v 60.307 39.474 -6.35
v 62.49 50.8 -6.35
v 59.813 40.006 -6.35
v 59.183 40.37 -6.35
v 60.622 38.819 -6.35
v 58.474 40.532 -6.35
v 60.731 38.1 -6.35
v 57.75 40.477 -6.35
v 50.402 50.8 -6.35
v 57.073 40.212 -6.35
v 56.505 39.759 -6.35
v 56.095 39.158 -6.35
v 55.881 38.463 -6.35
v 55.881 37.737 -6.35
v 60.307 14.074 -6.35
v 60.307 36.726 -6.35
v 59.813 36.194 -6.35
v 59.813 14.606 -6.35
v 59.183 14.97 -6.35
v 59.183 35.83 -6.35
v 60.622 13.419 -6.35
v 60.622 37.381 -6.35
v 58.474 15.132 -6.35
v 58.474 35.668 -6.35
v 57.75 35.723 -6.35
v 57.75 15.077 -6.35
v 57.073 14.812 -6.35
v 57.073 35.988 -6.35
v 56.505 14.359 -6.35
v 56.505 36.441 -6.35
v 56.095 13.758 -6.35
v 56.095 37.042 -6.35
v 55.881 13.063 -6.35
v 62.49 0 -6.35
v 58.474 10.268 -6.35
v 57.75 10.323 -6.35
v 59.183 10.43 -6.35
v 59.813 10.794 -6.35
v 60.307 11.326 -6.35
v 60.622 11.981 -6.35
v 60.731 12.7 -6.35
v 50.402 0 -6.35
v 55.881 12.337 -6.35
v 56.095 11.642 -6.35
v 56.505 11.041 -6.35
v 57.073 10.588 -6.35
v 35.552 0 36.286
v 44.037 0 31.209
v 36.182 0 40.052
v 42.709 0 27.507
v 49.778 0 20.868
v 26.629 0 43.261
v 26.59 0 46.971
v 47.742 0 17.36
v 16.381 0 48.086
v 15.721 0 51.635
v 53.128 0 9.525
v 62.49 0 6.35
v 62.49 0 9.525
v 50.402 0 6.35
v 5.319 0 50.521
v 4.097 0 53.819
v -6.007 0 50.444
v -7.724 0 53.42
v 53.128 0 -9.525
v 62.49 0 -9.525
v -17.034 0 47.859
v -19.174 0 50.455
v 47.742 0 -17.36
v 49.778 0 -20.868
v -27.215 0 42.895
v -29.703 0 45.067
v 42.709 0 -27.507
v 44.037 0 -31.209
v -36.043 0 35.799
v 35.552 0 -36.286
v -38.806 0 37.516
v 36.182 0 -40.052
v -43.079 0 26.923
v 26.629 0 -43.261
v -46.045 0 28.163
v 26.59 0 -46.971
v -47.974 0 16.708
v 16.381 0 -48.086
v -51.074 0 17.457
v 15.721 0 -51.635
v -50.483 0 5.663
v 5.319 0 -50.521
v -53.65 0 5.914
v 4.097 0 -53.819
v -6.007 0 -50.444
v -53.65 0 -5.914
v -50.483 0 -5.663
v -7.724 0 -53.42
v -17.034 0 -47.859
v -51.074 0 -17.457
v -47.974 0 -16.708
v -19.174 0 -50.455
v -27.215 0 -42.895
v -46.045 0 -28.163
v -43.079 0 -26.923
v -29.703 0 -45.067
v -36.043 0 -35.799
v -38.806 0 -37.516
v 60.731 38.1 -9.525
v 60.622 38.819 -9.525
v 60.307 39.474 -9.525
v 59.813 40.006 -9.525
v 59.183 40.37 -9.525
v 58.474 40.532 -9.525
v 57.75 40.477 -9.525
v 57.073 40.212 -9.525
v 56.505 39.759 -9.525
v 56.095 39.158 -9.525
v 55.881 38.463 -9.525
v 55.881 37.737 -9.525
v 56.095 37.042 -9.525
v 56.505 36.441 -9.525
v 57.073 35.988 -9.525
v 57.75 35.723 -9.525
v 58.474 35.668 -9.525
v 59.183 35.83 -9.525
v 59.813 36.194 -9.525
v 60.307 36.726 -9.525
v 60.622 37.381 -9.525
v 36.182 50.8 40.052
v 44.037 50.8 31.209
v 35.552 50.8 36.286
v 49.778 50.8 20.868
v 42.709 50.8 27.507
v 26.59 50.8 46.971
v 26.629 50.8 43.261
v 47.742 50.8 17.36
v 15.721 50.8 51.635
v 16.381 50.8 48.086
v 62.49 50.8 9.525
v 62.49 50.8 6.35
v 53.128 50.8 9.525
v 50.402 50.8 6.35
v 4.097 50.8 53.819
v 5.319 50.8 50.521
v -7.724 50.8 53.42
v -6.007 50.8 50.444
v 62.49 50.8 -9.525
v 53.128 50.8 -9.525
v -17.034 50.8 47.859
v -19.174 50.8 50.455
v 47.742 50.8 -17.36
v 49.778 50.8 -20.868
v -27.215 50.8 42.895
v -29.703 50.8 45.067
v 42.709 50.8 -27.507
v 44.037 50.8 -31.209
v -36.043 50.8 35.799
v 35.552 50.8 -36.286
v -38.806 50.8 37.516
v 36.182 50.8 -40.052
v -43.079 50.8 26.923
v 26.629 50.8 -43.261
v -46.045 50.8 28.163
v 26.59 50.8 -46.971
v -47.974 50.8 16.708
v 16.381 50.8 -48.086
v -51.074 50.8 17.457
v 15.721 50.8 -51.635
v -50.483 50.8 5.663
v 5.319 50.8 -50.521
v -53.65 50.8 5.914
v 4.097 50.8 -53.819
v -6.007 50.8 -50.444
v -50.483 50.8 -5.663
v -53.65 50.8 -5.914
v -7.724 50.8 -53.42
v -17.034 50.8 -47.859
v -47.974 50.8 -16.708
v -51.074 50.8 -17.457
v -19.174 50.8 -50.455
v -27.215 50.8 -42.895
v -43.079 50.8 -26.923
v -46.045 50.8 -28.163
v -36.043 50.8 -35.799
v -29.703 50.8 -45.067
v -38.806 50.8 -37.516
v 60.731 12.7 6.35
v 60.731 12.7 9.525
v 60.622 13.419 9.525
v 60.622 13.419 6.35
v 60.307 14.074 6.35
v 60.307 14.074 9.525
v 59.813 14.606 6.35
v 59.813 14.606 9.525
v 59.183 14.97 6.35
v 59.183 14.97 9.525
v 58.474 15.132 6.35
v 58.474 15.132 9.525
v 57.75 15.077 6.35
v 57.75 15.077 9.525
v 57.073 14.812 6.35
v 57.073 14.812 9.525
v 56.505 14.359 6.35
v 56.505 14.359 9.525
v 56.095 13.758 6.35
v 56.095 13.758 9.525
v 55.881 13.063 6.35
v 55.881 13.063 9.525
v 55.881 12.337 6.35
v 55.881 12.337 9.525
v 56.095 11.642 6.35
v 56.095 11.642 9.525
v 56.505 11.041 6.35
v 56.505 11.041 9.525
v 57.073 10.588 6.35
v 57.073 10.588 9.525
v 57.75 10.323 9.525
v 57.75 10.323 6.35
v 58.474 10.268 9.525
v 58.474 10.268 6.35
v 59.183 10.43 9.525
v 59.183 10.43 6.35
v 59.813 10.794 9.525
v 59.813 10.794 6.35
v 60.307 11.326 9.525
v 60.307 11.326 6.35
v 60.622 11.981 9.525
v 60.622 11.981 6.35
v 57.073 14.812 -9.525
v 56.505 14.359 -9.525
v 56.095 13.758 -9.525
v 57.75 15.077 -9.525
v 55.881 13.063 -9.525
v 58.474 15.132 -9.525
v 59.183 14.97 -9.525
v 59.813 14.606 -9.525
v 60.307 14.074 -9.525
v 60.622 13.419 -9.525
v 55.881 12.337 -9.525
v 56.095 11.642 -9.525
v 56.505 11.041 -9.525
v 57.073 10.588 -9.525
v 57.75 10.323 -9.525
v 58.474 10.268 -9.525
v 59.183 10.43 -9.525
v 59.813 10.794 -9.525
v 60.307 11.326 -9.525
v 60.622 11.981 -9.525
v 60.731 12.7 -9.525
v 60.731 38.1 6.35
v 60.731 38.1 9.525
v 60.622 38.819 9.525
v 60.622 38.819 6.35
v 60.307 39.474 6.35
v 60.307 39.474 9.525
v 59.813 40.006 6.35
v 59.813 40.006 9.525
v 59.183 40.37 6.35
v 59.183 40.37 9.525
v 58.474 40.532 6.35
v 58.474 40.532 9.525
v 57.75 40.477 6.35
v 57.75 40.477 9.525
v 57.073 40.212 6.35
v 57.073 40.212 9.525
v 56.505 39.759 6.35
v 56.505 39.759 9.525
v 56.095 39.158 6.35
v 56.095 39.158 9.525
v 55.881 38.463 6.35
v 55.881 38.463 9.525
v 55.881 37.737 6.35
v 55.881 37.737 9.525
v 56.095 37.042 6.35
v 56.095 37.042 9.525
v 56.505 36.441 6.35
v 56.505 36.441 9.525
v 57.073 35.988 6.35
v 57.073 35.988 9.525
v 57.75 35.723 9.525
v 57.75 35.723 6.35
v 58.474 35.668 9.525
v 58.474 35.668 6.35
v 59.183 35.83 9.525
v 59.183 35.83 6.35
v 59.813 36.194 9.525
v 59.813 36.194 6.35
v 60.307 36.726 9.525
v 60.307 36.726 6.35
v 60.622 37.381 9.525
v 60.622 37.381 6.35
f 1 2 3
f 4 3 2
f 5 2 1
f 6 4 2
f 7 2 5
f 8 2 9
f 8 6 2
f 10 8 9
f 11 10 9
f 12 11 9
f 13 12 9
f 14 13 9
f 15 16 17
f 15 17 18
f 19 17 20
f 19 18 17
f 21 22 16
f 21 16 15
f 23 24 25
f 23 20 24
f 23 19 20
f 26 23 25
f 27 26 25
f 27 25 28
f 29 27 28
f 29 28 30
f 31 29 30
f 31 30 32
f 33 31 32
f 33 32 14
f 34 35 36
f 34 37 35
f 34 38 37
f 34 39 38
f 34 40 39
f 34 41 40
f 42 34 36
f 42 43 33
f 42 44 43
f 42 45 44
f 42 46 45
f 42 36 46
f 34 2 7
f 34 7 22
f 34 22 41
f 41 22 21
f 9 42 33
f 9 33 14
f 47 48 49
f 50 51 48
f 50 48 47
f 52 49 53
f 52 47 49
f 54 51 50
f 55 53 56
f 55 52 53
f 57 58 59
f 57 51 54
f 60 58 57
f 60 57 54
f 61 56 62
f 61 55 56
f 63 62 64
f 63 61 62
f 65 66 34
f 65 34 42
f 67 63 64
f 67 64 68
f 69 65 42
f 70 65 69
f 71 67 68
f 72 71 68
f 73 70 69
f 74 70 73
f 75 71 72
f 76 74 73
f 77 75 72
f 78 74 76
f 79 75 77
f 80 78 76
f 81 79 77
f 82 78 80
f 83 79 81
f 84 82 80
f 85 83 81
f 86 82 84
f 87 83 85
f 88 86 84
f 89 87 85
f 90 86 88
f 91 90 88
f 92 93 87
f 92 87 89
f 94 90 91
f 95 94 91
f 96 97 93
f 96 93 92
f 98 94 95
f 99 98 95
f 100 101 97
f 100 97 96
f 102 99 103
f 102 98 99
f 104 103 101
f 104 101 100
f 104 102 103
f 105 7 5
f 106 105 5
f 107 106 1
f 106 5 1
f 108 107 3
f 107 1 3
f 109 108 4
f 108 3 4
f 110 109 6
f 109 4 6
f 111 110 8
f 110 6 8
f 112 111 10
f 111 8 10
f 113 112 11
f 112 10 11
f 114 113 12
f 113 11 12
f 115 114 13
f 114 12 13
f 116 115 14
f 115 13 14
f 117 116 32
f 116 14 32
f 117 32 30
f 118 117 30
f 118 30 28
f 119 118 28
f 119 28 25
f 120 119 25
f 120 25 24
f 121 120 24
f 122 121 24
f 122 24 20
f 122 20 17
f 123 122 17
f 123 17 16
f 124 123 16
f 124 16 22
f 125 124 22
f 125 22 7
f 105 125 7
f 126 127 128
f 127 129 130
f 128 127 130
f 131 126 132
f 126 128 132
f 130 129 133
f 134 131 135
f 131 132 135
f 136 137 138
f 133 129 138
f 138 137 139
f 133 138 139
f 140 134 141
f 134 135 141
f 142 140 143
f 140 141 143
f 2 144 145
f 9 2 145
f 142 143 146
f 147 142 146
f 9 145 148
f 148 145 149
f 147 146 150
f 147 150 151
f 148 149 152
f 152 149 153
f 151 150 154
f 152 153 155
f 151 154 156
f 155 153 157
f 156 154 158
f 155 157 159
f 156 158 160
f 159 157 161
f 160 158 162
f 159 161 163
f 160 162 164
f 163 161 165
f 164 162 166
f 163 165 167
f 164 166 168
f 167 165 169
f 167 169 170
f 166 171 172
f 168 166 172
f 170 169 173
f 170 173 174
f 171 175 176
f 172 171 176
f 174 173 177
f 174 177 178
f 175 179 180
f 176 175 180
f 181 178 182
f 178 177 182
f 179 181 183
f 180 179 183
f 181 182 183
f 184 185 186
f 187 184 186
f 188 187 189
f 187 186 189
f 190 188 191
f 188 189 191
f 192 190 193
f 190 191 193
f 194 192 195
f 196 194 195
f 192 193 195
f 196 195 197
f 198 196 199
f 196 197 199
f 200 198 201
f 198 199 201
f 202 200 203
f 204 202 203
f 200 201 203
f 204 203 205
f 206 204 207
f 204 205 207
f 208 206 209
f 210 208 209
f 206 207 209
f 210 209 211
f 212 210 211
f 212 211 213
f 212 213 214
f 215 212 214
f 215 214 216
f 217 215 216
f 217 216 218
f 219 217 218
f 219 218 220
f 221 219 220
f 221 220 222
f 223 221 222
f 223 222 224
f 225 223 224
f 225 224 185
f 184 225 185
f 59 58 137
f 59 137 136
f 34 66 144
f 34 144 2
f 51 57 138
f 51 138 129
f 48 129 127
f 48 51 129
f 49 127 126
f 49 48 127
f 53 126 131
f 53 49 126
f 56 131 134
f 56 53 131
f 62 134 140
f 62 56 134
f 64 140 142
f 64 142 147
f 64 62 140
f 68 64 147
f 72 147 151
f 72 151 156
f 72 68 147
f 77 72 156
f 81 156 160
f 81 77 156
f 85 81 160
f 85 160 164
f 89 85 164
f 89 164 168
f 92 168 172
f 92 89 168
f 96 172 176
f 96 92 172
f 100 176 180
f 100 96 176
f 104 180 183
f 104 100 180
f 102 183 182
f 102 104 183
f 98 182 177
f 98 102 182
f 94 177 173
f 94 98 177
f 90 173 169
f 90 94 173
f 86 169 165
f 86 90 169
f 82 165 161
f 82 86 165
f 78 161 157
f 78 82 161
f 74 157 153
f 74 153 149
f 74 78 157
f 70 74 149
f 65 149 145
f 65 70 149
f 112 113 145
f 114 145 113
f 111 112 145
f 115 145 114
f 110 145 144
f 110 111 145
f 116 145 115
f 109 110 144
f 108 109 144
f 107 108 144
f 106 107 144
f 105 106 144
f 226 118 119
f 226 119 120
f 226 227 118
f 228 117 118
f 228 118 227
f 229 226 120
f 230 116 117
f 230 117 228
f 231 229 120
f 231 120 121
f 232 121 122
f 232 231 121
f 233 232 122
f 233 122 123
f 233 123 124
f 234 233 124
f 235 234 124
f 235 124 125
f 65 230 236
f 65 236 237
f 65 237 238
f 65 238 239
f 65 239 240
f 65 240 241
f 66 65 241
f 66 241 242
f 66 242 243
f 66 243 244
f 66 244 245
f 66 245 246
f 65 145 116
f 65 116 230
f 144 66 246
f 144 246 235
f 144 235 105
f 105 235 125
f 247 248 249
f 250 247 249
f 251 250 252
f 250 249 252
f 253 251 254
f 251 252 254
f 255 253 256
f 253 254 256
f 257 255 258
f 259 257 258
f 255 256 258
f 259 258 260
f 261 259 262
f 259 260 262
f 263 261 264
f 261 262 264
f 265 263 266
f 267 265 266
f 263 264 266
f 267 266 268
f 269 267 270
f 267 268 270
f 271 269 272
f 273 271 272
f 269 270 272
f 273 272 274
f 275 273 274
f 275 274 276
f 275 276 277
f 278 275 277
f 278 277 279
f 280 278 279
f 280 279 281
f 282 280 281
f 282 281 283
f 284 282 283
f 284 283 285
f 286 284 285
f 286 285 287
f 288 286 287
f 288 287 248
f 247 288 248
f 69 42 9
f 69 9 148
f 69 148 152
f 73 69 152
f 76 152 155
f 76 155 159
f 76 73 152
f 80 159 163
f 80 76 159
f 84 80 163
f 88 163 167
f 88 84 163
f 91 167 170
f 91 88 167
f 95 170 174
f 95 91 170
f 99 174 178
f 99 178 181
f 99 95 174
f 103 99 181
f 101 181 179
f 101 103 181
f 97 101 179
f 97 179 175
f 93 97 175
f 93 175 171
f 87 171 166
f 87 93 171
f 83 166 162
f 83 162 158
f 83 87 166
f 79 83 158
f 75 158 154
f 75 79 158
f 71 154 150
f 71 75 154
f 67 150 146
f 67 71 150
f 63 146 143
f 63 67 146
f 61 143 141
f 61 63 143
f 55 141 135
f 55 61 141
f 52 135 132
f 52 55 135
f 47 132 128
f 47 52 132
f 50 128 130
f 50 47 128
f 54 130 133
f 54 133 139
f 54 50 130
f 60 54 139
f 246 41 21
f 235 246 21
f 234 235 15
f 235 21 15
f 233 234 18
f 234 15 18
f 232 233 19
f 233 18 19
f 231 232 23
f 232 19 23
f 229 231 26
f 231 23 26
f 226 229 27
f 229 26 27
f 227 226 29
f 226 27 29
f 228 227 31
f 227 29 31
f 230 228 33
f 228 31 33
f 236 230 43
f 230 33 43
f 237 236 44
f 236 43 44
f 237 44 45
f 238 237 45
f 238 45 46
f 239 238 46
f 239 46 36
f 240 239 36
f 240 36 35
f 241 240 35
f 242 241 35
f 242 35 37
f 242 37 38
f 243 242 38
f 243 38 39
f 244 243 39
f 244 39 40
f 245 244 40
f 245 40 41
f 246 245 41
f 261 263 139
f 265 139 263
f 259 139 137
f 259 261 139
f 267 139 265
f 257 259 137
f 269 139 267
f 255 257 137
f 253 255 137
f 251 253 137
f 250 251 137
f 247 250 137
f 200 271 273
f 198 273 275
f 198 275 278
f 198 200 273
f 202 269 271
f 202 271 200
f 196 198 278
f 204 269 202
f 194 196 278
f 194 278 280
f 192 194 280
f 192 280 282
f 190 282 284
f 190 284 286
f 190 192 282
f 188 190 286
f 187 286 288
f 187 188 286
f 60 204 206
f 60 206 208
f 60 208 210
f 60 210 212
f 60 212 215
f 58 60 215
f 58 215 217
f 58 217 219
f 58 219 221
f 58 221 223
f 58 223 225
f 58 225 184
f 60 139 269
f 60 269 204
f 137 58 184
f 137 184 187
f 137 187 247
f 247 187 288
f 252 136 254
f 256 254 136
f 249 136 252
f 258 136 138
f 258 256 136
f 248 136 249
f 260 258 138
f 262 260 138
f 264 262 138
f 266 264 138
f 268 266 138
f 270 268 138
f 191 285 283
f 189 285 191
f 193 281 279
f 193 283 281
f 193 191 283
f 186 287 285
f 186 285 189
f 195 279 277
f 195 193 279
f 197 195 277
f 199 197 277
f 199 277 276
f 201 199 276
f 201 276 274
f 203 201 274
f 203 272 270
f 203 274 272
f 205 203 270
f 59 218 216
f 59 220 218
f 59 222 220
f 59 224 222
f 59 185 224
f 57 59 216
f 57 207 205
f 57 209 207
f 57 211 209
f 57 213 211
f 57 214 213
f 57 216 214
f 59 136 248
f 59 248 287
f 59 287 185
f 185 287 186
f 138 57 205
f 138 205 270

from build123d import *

# Parameters (mm, degrees)
BOSS_EXTRUDE1_DEPTH = 50.8
SKETCH3_R           = 2.4384
CUT_EXTRUDE1_DEPTH  = 103.556868279


with BuildPart() as part:
    # Sketch2 → Boss-Extrude1 (new body)
    with BuildSketch(Plane(origin=(0, 0, 0), x_dir=(1, 0, 0), z_dir=(0, 1, 0))):
        with BuildLine():
            Line((53.600169076, -6.35), (62.490169076, -6.35))
            Line((62.490169076, -6.35), (62.490169076, -9.525))
            Line((62.490169076, -9.525), (53.600169076, -9.525))
            Line((53.600169076, -9.525), (53.127911685, -9.525))
            ThreePointArc((53.127911685, -9.525), (-53.975, 0), (53.127911685, 9.525))
            Line((53.127911685, 9.525), (53.600169076, 9.525))
            Line((53.600169076, 9.525), (62.490169076, 9.525))
            Line((62.490169076, 9.525), (62.490169076, 6.35))
            Line((62.490169076, 6.35), (53.600169076, 6.35))
            Line((53.600169076, 6.35), (50.401562476, 6.35))
            ThreePointArc((50.401562476, 6.35), (-50.8, 0), (50.401562476, -6.35))
            Line((50.401562476, -6.35), (53.600169076, -6.35))
        make_face()
    extrude(amount=BOSS_EXTRUDE1_DEPTH)

    # Sketch3 → Cut-Extrude1 (cut, through all)
    with BuildSketch(Plane.XY.offset(9.525)):
        with Locations((58.292206061, 38.1)):
            Circle(SKETCH3_R)
        with Locations((58.292206061, 12.7)):
            Circle(SKETCH3_R)
    extrude(amount=-CUT_EXTRUDE1_DEPTH, mode=Mode.SUBTRACT)


solid = part.part
